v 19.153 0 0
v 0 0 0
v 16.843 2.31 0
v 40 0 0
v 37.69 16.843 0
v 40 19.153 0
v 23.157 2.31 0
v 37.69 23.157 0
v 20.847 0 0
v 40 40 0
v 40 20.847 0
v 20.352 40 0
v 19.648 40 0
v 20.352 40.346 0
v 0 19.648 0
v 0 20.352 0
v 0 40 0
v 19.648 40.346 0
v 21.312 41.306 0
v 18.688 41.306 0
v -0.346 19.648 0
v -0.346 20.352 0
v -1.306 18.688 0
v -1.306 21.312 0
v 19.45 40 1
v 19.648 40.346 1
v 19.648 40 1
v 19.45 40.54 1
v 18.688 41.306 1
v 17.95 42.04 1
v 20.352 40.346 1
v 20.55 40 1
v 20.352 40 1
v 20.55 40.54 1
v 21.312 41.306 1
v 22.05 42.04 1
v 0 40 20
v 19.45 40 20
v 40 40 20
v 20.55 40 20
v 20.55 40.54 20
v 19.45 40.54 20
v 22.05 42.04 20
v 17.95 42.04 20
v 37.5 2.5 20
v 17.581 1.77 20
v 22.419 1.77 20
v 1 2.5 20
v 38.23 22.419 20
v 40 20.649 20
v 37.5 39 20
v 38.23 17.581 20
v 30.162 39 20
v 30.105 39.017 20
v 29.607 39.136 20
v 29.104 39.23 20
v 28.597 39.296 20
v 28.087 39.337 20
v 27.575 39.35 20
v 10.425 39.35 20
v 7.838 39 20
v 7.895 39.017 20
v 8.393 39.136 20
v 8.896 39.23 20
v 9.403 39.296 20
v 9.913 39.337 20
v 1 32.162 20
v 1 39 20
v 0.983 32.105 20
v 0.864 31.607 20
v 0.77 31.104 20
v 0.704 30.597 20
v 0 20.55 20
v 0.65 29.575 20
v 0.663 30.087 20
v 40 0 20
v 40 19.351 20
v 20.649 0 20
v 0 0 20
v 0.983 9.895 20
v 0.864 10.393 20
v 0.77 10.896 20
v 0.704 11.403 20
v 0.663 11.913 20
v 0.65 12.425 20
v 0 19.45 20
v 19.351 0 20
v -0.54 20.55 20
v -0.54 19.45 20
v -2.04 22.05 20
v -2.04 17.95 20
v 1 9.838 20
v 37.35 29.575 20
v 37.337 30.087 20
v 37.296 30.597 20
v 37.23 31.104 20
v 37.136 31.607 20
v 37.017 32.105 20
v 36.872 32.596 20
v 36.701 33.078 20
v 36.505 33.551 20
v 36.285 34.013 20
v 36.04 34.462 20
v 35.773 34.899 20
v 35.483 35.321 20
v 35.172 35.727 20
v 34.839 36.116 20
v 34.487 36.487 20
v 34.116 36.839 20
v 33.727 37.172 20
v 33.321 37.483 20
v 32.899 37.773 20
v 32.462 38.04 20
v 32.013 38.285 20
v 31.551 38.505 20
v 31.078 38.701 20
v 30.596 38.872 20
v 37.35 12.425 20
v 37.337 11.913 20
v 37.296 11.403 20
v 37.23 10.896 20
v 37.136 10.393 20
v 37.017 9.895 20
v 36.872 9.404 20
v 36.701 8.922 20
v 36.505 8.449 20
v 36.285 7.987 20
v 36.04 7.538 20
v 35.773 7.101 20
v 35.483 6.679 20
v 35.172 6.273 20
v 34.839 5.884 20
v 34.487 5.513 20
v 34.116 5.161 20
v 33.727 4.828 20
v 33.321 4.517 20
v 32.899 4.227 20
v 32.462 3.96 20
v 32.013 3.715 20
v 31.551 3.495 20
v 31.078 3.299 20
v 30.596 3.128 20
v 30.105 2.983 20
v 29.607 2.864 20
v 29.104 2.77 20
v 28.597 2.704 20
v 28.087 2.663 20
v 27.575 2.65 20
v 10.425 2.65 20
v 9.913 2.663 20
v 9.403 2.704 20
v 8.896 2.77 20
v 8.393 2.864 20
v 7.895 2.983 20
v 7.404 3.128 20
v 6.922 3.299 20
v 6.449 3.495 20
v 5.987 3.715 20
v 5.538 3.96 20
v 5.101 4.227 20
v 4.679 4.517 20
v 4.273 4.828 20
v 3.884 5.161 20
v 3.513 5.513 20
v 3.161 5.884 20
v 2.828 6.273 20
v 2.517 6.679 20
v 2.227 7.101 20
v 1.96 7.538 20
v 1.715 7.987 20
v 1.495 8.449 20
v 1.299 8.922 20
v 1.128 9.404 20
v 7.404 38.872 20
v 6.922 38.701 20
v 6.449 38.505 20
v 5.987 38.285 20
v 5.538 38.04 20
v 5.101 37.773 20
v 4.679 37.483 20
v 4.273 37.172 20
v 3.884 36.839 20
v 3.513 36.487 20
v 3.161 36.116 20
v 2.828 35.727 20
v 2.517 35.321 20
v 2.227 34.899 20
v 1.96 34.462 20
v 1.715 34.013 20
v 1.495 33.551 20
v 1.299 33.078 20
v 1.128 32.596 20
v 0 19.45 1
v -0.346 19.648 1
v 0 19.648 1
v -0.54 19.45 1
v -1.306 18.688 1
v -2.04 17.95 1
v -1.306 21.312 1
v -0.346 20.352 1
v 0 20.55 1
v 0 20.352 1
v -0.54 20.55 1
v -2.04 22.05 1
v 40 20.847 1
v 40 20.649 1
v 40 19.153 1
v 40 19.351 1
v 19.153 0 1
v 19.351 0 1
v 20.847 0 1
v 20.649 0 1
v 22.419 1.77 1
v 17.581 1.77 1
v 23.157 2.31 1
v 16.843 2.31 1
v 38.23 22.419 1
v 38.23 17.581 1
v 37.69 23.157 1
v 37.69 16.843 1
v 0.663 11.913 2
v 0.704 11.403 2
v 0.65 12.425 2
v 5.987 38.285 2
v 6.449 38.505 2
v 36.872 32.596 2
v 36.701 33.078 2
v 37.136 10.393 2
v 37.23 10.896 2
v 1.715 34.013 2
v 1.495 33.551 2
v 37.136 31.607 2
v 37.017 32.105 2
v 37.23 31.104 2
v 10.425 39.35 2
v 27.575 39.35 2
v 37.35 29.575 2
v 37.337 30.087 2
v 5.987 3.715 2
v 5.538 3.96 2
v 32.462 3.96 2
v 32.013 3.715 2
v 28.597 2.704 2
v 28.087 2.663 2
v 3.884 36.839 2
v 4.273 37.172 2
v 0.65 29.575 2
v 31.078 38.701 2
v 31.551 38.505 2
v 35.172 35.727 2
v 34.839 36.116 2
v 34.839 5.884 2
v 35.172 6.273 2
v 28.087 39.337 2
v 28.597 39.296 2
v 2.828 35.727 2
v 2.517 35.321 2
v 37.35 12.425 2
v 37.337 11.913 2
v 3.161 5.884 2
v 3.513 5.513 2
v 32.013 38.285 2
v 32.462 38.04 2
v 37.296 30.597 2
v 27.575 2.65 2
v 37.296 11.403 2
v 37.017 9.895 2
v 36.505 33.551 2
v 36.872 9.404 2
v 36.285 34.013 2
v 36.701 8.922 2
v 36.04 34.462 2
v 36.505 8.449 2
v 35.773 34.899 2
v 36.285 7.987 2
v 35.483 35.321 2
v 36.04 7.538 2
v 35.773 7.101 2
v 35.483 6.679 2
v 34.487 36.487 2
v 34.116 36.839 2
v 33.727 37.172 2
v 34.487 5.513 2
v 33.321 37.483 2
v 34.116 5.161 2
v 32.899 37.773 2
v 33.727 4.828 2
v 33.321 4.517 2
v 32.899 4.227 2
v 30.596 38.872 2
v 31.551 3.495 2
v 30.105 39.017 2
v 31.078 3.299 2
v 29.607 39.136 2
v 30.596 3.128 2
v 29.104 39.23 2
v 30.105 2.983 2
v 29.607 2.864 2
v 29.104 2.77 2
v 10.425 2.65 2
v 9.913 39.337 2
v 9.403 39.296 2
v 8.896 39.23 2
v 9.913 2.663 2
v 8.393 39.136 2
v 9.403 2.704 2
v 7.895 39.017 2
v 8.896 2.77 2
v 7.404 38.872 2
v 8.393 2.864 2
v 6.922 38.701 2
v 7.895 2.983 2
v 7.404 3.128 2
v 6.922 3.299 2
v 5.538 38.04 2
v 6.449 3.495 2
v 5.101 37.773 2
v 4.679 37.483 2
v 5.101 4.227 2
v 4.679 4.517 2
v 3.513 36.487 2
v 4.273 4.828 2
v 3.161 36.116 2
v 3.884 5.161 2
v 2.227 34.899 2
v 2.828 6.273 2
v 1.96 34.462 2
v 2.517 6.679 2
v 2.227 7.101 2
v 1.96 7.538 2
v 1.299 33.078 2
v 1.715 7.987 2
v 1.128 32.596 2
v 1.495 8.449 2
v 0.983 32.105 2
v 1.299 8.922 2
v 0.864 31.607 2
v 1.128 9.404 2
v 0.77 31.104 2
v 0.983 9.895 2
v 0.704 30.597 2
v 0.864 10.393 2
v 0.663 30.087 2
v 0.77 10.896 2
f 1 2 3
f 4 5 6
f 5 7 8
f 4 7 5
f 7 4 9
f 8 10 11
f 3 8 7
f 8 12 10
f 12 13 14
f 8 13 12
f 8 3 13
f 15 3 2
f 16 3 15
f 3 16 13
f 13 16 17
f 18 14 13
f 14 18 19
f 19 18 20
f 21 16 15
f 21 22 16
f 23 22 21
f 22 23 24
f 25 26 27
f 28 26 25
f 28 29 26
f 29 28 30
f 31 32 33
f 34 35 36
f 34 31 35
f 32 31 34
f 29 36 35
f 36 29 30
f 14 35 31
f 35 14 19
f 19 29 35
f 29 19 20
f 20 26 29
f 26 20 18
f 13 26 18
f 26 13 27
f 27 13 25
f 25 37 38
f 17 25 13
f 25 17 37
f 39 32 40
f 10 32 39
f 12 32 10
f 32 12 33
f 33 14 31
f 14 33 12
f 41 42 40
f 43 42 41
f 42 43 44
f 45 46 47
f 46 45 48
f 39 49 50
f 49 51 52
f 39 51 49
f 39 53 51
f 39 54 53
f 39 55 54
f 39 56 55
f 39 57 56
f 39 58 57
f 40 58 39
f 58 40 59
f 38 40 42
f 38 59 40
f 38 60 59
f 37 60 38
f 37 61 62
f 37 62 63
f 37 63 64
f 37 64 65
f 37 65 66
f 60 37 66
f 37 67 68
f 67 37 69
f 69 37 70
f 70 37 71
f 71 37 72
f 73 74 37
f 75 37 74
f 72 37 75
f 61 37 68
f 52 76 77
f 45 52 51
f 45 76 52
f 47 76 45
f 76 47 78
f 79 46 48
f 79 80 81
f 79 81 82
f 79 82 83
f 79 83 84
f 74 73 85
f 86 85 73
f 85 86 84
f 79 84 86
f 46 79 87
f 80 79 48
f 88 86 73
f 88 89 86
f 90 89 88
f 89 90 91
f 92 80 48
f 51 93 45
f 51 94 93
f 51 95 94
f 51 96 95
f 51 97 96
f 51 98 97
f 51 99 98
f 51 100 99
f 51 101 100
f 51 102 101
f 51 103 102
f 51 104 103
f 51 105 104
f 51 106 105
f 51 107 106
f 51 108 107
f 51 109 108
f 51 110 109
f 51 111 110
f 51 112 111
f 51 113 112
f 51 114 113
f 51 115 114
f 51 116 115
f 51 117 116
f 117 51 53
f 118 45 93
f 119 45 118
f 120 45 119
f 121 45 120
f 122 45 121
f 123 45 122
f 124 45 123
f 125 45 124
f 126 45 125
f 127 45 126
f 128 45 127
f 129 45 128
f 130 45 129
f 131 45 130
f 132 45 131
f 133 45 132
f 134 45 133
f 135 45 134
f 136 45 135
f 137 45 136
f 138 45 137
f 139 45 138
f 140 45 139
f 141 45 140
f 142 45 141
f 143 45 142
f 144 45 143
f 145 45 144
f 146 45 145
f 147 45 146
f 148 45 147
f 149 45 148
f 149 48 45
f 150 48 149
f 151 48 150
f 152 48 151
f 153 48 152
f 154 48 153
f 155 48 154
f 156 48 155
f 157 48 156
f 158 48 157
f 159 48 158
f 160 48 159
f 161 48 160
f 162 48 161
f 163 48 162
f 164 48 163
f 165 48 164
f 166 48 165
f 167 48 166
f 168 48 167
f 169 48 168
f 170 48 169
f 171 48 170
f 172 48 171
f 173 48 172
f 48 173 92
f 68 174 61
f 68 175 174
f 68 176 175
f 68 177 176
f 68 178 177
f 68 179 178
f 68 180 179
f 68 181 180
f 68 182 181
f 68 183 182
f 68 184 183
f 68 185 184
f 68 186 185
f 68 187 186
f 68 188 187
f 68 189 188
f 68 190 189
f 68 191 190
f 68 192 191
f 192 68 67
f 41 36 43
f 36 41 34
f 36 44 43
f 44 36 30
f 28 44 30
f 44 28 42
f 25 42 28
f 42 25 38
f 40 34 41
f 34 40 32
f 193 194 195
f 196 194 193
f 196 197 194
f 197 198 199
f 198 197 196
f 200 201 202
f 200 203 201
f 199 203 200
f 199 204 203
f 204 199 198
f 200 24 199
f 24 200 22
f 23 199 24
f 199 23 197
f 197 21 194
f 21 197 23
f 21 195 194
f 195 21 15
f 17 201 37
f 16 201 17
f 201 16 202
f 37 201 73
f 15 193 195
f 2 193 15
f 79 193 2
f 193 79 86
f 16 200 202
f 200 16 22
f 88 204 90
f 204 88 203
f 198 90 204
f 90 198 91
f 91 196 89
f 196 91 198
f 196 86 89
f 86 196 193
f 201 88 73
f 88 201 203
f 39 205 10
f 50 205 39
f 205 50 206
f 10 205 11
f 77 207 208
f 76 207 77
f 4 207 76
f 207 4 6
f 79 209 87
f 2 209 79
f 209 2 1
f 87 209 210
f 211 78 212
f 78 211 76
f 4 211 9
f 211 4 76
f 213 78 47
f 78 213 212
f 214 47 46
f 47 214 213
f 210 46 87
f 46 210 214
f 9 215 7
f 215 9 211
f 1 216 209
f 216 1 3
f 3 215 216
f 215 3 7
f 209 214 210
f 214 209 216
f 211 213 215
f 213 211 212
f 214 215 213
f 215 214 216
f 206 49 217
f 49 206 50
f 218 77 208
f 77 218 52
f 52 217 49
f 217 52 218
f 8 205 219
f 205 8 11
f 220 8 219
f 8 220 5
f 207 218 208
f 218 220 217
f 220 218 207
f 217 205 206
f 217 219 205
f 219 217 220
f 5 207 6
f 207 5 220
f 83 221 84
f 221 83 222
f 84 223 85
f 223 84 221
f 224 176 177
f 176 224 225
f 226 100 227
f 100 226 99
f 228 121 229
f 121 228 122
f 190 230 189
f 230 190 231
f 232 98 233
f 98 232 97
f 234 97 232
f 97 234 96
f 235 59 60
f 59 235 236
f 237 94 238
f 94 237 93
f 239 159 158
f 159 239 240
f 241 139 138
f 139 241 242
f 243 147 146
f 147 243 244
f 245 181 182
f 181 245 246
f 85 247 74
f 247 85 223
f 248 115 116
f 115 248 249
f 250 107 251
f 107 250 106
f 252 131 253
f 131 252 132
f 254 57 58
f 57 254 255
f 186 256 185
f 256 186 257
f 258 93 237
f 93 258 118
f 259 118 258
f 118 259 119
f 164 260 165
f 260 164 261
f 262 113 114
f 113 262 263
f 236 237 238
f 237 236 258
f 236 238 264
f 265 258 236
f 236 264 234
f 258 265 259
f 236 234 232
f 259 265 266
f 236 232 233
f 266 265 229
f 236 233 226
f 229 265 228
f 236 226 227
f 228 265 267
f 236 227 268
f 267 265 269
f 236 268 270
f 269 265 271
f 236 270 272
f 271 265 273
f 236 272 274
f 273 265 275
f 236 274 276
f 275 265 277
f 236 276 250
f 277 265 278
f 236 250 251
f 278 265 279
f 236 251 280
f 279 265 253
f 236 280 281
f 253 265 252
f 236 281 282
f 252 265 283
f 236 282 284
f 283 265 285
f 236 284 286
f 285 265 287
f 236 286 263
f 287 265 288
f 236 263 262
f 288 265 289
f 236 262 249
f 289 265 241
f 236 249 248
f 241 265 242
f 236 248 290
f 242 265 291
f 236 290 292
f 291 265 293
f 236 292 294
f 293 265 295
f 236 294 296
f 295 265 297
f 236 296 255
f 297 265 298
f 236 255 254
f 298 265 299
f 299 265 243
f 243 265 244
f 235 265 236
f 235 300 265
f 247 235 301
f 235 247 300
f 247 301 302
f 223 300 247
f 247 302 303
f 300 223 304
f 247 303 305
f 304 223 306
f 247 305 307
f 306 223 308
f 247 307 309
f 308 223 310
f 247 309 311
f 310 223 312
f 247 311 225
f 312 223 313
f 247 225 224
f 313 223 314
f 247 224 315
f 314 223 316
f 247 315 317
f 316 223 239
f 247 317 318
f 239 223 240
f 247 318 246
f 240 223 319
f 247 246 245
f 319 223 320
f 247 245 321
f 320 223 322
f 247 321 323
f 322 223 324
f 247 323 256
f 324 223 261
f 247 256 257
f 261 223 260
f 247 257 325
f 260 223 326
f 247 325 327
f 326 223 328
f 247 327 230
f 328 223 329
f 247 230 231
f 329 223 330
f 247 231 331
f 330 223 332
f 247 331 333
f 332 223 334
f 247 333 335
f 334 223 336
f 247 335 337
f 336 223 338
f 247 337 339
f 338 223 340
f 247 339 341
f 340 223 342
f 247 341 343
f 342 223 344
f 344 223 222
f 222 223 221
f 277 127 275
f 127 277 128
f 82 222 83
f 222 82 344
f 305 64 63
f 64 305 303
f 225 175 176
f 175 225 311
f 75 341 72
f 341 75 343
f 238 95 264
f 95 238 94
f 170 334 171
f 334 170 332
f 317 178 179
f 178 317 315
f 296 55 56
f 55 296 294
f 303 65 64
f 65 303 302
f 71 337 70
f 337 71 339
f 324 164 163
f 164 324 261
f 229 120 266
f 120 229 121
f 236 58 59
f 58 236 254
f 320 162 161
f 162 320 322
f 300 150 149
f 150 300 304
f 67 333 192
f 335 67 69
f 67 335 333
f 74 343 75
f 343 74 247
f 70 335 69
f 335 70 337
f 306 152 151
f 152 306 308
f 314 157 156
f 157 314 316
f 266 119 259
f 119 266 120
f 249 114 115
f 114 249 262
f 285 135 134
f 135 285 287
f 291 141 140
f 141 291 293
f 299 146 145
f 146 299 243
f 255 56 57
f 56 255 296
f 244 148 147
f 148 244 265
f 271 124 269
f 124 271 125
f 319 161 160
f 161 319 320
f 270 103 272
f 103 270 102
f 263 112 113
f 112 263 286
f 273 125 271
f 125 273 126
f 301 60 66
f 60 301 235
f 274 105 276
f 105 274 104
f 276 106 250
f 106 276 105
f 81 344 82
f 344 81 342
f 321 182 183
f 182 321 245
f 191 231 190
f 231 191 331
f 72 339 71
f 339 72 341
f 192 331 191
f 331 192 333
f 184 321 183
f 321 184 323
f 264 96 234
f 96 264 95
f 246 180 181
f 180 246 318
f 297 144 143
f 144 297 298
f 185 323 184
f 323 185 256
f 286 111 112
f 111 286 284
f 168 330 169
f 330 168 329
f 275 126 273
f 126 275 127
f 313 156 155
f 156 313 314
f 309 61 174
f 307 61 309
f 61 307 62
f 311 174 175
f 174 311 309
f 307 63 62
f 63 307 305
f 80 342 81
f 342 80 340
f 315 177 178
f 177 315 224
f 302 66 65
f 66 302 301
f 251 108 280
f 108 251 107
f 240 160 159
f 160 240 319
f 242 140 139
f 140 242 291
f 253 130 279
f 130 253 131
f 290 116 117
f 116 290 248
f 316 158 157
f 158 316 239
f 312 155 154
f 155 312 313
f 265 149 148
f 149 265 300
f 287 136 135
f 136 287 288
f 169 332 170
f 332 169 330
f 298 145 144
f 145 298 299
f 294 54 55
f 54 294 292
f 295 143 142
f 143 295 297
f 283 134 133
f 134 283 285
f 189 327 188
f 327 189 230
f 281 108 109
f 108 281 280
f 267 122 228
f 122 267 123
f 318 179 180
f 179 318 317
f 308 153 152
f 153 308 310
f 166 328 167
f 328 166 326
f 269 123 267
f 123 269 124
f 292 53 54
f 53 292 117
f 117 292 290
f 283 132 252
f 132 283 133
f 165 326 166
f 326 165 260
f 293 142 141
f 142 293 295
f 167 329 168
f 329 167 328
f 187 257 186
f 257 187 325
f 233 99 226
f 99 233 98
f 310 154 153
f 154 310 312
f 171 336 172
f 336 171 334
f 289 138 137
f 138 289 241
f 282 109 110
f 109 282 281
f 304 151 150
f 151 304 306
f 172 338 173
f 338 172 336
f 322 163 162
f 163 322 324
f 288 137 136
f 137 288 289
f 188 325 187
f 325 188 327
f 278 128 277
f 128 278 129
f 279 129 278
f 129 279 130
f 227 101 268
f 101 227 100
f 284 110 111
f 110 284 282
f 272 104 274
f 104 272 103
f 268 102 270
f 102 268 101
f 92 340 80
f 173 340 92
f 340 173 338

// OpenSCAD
// file: ../batterytravelcase/battery_holder_quad_aa.scad
top_bottom = [-1, 1];
pad = 0.01; // Padding to maintain mainfold
wall_thickness = 2;
bottom_thickness = 1;
battery_r = 14.75 / 2;

// Actual sizes
//
battery_h = 51;
heights = [ (battery_h * (1/3)) + wall_thickness,
            (battery_h * (2/3)) + wall_thickness ];

// bottom_h = (battery_h * (2/3)) + wall_thickness;
// top_h = (battery_h * (1/3)) + wall_thickness;

// Test sizes
// battery_h = 8;
//
// bottom_h = (battery_h * (1/2)) + wall_thickness;
// top_h = (battery_h * (1/2)) + wall_thickness;

inter_battery_offset = wall_thickness - 0.8;
lip_height = 4;
lip_thickness = 0.8;
circle_offset = battery_r + inter_battery_offset;

two_by_two = [[ circle_offset, circle_offset],
              [-circle_offset, circle_offset],
              [-circle_offset,-circle_offset],
              [ circle_offset,-circle_offset]];

two_by_one =  [[ circle_offset, 0],
               [-circle_offset, 0]];

four_by_one = [[ 0, 3*circle_offset],
               [ 0,   circle_offset],
               [ 0,  -circle_offset],
               [ 0,-(3*circle_offset)]];

three_by_one = [[ 0, 3*circle_offset],
                [ 0,   circle_offset],
                [ 0,  -circle_offset]];
           


module battery_box(height, circle_centers, lip) {
  difference() {
    union() {
      linear_extrude(height = height, center = false, convexity = 10, twist = 0) {
        hull() {
          union() {
            for( i = circle_centers ) {
              translate(i) {
                circle(battery_r + wall_thickness);
              }
            }
          }
        }
      }

      // If the lip is positive then it is unioned with our outer hull
      //
      if ( lip > 0 ) {
        for( i = circle_centers ) {
          translate(i) {
            translate(v = [0, 0, height-pad]) {
              cylinder(h = lip - 0.2, r = battery_r + (lip_thickness-0.1));
            }
          }
        }
      }
    }

    // If the lip is negative then it is differenced out of our hull (so
    // positive is the male edge, and negative female is the edge of a
    // top/bottom pair, male on the bottom.)
    //
    if (lip < 0) {
      for( i = circle_centers ) {
        translate(i) {
          translate(v = [0, 0, height + lip + 0.1]) {
            cylinder(h = abs(lip), r = battery_r + (lip_thickness));
          }
        }
      }
    }

    // Four cylinders for batteries
    //
    union() {
      translate(v=[0,0,wall_thickness]) {
        for( i = circle_centers ) {
          translate(i) {
            cylinder(h = battery_h, r = battery_r );
          }
        }
      }
    }
  }
}

// In the following for-loop substitute "two_by_one" "two_by_two" etc, as
// defined at the top of the file, for the second argument to pick which
// formation of battery holder you want.
//
for (i = [0:1] ) {
  translate(v = [top_bottom[i] * (2*circle_offset + 5), 0, 0]) {
    battery_box(heights[i], two_by_one, top_bottom[i] * lip_height);
  }
}
// file: interlockingmodule.scad
//this section defines a module for creating a "rounded" bottom to the box, useful when storing small parts
module RoundBottom(width, length, height){    
    translate([0,length,0])rotate([90,0,0])
    linear_extrude(length, center=false)
    
    difference() {
        translate([-width/2,0,0])square([width,height/2],center=false);
        translate([0,height/2,0])resize([width,height]) circle(d=width*10);
    }
}


module interlockingbox(
    //Box Width in units
    BoxWidthUnits = 3,
    //Box Length in units
    BoxLengthUnits = 3,
    //Box Height in mm
    BoxHeight = 120,
    //Box Floor Thickness in mm
    BoxFloor = 2,
    //North Wall open or closed
    NorthWallOpen = 0, // [0:Closed, 1:Open]
    //South Wall open or closed
    SouthWallOpen = 0 // [0:Closed, 1:Open]
)
{
echo(version=version(2.0));
//comments: Version 2 adds anti-"elephant foot" scaling at bottom of dovetail sections
/* [Size] */
//Box unit size in mm. This defines the size of 1 'unit' for your box.
BoxUnits = 40;
BoxWidth = BoxWidthUnits * BoxUnits;
BoxLength = BoxLengthUnits * BoxUnits;
//Box Wall Thickness in mm
BoxWall = 1;
//Fit Factor. Greater factor = looser fit
FitFactor = 0.18;  // [0:0.05:0.4]
//RoundedBottom = "EW"; // [EW:East-West, NS:North-South]
RoundedBottom = ""; // [EW:East-West, NS:North-South]

/* [Walls] */

/* [Dovetail] */
//Dovetail inside length in mm
DTInsideLength = 1.1;
//Dovetail angle in degrees
DTAngle = 45;
//Dovetail width in mm
DTWidth = 1.5;

/* [Hidden] */
//This helps calculate the length of the 'long' side of the dovetail
DTx=tan(DTAngle)*DTWidth;
//This polygon defines the dovetail shape
DTShape = [[0,0],[DTInsideLength/2,0],[DTInsideLength/2+DTx,DTWidth],[-DTInsideLength/2-DTx,DTWidth],[-DTInsideLength/2,0]];



union(){
    //creates and transforms rounded bottom
    if (RoundedBottom=="EW") {
    translate([0,(BoxWidth/2)+BoxWall,BoxFloor])
    rotate([0,0,-90])
    RoundBottom(BoxWidth-DTWidth-(BoxWall),BoxLength-DTWidth-BoxWall,2*(BoxHeight-BoxFloor));
    }

    //creates rounded bottom oriented North-South
    if (RoundedBottom=="NS") {
    translate([(BoxLength/2)-BoxWall,DTWidth+BoxWall/2,BoxFloor])
    rotate([0,0,0])
    RoundBottom(BoxLength-DTWidth-(BoxWall),BoxWidth-DTWidth-BoxWall,2*(BoxHeight-BoxFloor));
    }

    //Creates main box,without round bottom
    difference(){
        
    union(){
        //main box
    cube([BoxLength,BoxWidth,BoxHeight], center=false);

        //male dovetails
    for (i=[1:BoxLengthUnits])
    translate([(i-1)*BoxUnits+(BoxUnits/2),BoxWidth,0])
        //in 2 sections. first section is slightly scaled down to counter "elephant foot"
        union(){
            linear_extrude(height=1, center=false)
                scale([1-(2*FitFactor),1-(2*FitFactor),1])
                union(){        
                    //this adds a slight offset to the male dovetail for a looser fit
                    translate([-DTInsideLength/2,0,0])
                    square([DTInsideLength,DTWidth]);
                    //main dovetail shape
                    translate([0,DTWidth*FitFactor*2,0])
                    polygon(DTShape);
                };
            translate([0,0,1])
            linear_extrude(height=BoxHeight-1, center=false)
                    union(){
                    //this adds a slight offset to the male dovetail for a looser fit
                    translate([-DTInsideLength/2,0,0])
                    square([DTInsideLength,DTWidth]);
                    //main dovetail shape
                    translate([0,DTWidth*FitFactor*2,0])
                    polygon(DTShape);
                    };
        }        

    for (i=[1:BoxWidthUnits])
    translate([0,(i-1)*BoxUnits+(BoxUnits/2),0])
        //in 2 sections. first section is slightly scaled down to counter "elephant foot"
        rotate([0,0,90])
        union(){
            linear_extrude(height=1, center=false)				//1mm high anti-elephant foot section
                scale([1-(2*FitFactor),1-(2*FitFactor),1])
                union(){        
                    //this adds a slight offset to the male dovetail for a looser fit
                    translate([-DTInsideLength/2,0,0])
                    square([DTInsideLength,DTWidth]);
                    //main dovetail shape
                    translate([0,DTWidth*FitFactor*2,0])
                    polygon(DTShape);
                };
            translate([0,0,1])
            linear_extrude(height=BoxHeight-1, center=false)
                union(){
                    //male dovetail offset
                    translate([-DTInsideLength/2,0,0])
                    square([DTInsideLength,DTWidth]);
                    //main dovetail shape
                    translate([0,DTWidth*FitFactor*2,0])
                    polygon(DTShape);
                };
        }
    }
    //female dovetails
    for (i=[1:BoxLengthUnits])
        union(){
            translate([(i-1)*BoxUnits+(BoxUnits/2),0,0])
                scale([1+FitFactor,1+FitFactor,1])
                linear_extrude(height=BoxHeight, center=false)
                polygon(DTShape);
        
            //added a second dovetail cutout at the bottom, scaled up to counter "elephant foot" when printed
            translate([(i-1)*BoxUnits+(BoxUnits/2),0,0])
                scale([1+(3*FitFactor),1+(3*FitFactor),1])
                linear_extrude(height=1, center=false)
                polygon(DTShape);					
        }

    for (i=[1:BoxWidthUnits])
        union(){
            translate([BoxLength,(i-1)*BoxUnits+(BoxUnits/2),0])
                rotate([0,0,90])
                    scale([1+FitFactor,1+FitFactor,1])
                        linear_extrude(height=BoxHeight, center=false)
                            polygon(DTShape);
            //added a second dovetail cutout at the bottom, scaled up to counter "elephant foot" when printed
            translate([BoxLength,(i-1)*BoxUnits+(BoxUnits/2),0])
                rotate([0,0,90])
                    scale([1+(3*FitFactor),1+(3*FitFactor),1])
                        linear_extrude(height=1, center=false)
                            polygon(DTShape);	
        }
    //carves out main box
    translate([BoxWall,DTWidth+BoxWall,BoxFloor])
        cube([BoxLength-(2*BoxWall)-DTWidth, (BoxWidth-(2*BoxWall)-DTWidth), BoxHeight]);

    if (NorthWallOpen)
        translate([-DTWidth*(1+FitFactor+FitFactor),BoxWall+DTWidth,BoxFloor])
            cube([BoxWall+(DTWidth*(1+FitFactor+FitFactor)), (BoxWidth-(2*BoxWall)-DTWidth), BoxHeight]);    

    if (SouthWallOpen)
        translate([BoxLength-(BoxWall)-DTWidth,BoxWall+DTWidth,BoxFloor])
            cube([BoxWall+DTWidth, (BoxWidth-(2*BoxWall)-DTWidth), BoxHeight]);

    }
  }
}

// Cutout to make sure the actual box with groves is properly printed
// Use this with difference() to remove trim internal to fit the box.
module negativeBox(
    //Box Width in units
    BoxWidthUnits = 3,
    //Box Length in units
    BoxLengthUnits = 3,
    //Box Height in mm
    BoxHeight = 120,
    //Box unit size in mm. This defines the size of 1 'unit' for your box.
    BoxUnits = 40,
)
{
    difference () {
        translate([-5,-3,0])
        cube([BoxLengthUnits*BoxUnits+8,BoxWidthUnits*BoxUnits+8,BoxHeight]);

    translate([0.5,2,0])
        cube([BoxLengthUnits*BoxUnits-2.5,BoxWidthUnits*BoxUnits-2.5,BoxHeight]);
    }
}

interlockingbox(2,3,40);

// This will create a sliver of a wall if working properly
//difference() {
//    interlockingbox(2,3,40);
//    negativeBox(2,3,40);
//}
// main file
use <interlockingmodule.scad>
use <../batterytravelcase/battery_holder_quad_aa.scad>

$fn=120;

height=20;

BoxUnits=40;
BoxWidthUnits=1;
BoxLengthUnits=1;

top_bottom = [-1, 1];
pad = 0.01; // Padding to maintain mainfold
wall_thickness = 2;
bottom_thickness = 1;
battery_r = 14.75 / 2;
inter_battery_offset = wall_thickness - 0.8;
lip_height = 4;
lip_thickness = 0.8;
circle_offset = battery_r + inter_battery_offset;


two_by_two = [[ circle_offset, circle_offset],
              [-circle_offset, circle_offset],
              [-circle_offset,-circle_offset],
              [ circle_offset,-circle_offset]];

two_by_one =  [[ circle_offset, 0],
               [-circle_offset, 0]];

four_by_one = [[ 0, 3*circle_offset],
               [ 0,   circle_offset],
               [ 0,  -circle_offset],
               [ 0,-(3*circle_offset)]];

three_by_one = [[ 0, 3*circle_offset],
                [ 0,   circle_offset],
                [ 0,  -circle_offset]];
           

    

module battery_box(height, circle_centers, lip) {
  difference() {
    union() {
      linear_extrude(height = height, center = false, convexity = 10, twist = 0) {
        hull() {
          union() {
            for( i = circle_centers ) {
              translate(i) {
                circle(battery_r + wall_thickness+0.4);
              }
            }
          }
        }
      }
    }
  }
}
    
difference() {
  interlockingbox(BoxWidthUnits,BoxLengthUnits,height,height);
  translate([19,21,2]) battery_box(height,two_by_two,0);
}   
